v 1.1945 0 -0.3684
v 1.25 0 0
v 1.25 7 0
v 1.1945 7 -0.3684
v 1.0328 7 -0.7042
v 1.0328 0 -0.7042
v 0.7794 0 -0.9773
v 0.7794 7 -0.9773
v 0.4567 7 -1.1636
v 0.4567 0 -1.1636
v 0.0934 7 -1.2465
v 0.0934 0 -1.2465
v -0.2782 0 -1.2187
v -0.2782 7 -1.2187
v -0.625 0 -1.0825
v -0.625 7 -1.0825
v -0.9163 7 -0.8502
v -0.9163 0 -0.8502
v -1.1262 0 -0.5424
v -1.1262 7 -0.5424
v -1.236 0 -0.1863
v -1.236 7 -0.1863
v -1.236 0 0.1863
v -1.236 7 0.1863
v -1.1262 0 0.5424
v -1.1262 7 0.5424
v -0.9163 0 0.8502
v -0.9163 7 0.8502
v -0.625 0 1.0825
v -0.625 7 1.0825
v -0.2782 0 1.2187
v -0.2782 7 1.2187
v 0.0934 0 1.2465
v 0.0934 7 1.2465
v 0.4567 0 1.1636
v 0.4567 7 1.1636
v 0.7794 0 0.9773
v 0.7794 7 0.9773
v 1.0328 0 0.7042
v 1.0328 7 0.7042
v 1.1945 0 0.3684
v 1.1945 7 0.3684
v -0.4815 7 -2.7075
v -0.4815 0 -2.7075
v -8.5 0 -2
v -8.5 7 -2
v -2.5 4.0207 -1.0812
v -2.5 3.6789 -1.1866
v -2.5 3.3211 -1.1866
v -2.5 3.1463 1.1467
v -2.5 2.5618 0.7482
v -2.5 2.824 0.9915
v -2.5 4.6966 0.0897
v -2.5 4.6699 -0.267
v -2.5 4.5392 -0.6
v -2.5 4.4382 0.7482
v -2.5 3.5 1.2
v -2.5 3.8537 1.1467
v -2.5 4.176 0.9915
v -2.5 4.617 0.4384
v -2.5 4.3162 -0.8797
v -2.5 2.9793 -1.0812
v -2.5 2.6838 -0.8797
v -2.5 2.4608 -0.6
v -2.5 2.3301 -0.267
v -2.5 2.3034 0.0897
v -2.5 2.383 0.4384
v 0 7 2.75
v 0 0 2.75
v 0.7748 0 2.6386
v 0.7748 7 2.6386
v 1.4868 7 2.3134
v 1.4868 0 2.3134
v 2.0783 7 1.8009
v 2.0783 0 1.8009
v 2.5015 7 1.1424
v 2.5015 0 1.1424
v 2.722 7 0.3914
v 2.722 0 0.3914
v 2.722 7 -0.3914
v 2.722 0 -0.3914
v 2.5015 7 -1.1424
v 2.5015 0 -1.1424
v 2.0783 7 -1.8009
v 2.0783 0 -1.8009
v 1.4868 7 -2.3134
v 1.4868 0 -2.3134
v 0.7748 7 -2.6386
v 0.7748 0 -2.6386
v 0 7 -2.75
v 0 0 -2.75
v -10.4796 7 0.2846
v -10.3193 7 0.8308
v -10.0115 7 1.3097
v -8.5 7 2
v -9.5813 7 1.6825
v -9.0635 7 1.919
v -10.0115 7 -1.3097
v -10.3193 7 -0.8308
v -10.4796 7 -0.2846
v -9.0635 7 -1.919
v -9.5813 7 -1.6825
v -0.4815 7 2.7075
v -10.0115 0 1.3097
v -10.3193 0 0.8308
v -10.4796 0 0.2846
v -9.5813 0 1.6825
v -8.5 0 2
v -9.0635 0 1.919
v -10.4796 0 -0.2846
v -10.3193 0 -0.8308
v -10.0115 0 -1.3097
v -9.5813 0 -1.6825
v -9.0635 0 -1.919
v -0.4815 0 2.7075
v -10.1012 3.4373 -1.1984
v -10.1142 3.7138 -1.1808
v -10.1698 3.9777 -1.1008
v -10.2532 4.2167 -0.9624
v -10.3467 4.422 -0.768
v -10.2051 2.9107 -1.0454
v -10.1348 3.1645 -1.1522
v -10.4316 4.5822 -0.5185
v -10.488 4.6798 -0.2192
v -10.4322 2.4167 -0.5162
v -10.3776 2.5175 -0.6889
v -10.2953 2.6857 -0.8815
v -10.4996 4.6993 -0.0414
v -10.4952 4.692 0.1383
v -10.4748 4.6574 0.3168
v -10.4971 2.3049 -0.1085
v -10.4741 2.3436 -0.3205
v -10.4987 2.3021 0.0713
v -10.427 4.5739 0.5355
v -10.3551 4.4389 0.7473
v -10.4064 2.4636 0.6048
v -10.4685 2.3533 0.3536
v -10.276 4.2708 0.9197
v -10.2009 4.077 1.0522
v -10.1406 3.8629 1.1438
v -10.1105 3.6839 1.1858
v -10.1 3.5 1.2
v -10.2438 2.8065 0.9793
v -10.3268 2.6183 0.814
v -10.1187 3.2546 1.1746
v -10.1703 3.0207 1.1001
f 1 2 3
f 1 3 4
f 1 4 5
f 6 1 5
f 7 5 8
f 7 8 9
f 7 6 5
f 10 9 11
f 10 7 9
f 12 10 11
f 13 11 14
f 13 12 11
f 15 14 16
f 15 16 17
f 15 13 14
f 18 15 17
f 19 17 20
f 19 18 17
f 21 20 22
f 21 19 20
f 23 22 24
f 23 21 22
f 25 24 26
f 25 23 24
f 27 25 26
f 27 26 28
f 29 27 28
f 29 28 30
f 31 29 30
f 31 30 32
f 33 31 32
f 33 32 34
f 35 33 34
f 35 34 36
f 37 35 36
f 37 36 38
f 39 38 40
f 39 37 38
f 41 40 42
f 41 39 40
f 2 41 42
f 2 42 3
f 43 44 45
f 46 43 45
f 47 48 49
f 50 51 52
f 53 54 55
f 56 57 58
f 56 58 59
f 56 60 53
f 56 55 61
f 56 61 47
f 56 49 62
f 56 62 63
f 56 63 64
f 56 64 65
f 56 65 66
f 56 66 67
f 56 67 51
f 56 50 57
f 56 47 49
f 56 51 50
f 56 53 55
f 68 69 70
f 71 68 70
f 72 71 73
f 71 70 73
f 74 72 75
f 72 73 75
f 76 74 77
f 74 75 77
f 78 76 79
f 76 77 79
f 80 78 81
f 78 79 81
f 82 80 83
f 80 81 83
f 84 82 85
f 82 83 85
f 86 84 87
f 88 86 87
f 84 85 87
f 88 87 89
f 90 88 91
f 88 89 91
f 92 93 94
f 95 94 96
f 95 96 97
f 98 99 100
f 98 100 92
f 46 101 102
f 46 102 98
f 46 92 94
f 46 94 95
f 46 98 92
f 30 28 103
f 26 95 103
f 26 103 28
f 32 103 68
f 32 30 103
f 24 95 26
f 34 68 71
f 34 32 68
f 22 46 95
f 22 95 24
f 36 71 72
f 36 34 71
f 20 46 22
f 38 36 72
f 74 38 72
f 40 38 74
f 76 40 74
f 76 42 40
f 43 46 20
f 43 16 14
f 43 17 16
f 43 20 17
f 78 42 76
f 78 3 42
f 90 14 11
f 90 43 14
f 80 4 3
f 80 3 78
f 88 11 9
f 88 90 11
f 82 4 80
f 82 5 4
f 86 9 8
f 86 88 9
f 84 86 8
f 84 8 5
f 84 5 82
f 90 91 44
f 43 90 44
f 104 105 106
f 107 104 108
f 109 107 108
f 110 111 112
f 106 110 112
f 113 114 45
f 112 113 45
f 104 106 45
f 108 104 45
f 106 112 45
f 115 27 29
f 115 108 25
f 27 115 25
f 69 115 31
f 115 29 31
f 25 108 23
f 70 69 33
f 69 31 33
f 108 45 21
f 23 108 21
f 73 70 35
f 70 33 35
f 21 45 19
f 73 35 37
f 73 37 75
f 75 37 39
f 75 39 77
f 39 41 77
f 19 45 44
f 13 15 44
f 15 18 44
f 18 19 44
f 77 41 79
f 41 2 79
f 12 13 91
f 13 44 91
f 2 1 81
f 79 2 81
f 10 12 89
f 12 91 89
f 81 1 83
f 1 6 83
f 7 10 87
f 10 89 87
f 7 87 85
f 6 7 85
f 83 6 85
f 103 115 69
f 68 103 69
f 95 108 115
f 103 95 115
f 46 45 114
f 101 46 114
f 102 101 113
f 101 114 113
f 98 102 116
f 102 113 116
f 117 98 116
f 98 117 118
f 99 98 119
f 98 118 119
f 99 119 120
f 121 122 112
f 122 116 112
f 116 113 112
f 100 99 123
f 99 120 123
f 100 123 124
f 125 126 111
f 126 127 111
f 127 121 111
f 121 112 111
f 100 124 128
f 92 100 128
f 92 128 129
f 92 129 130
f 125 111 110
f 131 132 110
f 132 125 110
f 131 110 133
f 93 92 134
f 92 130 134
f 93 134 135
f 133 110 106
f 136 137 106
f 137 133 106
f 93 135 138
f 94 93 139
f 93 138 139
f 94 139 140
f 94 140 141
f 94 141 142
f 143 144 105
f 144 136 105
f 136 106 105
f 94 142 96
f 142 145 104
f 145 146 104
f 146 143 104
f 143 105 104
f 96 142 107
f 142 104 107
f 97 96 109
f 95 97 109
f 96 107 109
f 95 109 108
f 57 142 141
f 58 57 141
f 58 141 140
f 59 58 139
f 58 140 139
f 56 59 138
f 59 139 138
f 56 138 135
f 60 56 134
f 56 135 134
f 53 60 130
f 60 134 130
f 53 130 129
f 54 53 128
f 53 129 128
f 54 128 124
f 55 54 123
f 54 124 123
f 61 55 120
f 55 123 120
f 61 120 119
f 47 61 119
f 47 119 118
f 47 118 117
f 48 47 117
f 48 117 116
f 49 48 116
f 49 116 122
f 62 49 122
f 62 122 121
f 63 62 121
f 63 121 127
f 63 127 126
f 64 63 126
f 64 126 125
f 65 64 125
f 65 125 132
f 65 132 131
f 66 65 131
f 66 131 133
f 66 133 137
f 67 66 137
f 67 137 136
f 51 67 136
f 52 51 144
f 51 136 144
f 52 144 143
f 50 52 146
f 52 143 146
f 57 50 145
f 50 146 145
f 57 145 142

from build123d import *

# Parameters (mm, degrees)
SKETCH1_R           = 1.25
BOSS_EXTRUDE1_DEPTH = 7
SKETCH2_R           = 1.2
CUT_EXTRUDE1_DEPTH  = 8


with BuildPart() as part:
    # Sketch1 → Boss-Extrude1 (new body)
    with BuildSketch(Plane(origin=(0, 0, 0), x_dir=(1, 0, 0), z_dir=(0, 1, 0))):
        with BuildLine():
            Line((-0.481545064, 2.70751073), (-8.5, 2))
            ThreePointArc((-8.5, 2), (-10.5, 0), (-8.5, -2))
            Line((-8.5, -2), (-0.481545064, -2.70751073))
            Line((-0.481545064, -2.70751073), (0, -2.75))
            ThreePointArc((0, -2.75), (2.75, 0), (0, 2.75))
            Line((0, 2.75), (-0.481545064, 2.70751073))
        make_face()
        Circle(SKETCH1_R, mode=Mode.SUBTRACT)
    extrude(amount=BOSS_EXTRUDE1_DEPTH)

    # Sketch2 → Cut-Extrude1 (cut)
    with BuildSketch(Plane.ZY.offset(10.5)):
        with Locations((0, 3.5)):
            Circle(SKETCH2_R)
    extrude(amount=-CUT_EXTRUDE1_DEPTH, mode=Mode.SUBTRACT)


solid = part.part
